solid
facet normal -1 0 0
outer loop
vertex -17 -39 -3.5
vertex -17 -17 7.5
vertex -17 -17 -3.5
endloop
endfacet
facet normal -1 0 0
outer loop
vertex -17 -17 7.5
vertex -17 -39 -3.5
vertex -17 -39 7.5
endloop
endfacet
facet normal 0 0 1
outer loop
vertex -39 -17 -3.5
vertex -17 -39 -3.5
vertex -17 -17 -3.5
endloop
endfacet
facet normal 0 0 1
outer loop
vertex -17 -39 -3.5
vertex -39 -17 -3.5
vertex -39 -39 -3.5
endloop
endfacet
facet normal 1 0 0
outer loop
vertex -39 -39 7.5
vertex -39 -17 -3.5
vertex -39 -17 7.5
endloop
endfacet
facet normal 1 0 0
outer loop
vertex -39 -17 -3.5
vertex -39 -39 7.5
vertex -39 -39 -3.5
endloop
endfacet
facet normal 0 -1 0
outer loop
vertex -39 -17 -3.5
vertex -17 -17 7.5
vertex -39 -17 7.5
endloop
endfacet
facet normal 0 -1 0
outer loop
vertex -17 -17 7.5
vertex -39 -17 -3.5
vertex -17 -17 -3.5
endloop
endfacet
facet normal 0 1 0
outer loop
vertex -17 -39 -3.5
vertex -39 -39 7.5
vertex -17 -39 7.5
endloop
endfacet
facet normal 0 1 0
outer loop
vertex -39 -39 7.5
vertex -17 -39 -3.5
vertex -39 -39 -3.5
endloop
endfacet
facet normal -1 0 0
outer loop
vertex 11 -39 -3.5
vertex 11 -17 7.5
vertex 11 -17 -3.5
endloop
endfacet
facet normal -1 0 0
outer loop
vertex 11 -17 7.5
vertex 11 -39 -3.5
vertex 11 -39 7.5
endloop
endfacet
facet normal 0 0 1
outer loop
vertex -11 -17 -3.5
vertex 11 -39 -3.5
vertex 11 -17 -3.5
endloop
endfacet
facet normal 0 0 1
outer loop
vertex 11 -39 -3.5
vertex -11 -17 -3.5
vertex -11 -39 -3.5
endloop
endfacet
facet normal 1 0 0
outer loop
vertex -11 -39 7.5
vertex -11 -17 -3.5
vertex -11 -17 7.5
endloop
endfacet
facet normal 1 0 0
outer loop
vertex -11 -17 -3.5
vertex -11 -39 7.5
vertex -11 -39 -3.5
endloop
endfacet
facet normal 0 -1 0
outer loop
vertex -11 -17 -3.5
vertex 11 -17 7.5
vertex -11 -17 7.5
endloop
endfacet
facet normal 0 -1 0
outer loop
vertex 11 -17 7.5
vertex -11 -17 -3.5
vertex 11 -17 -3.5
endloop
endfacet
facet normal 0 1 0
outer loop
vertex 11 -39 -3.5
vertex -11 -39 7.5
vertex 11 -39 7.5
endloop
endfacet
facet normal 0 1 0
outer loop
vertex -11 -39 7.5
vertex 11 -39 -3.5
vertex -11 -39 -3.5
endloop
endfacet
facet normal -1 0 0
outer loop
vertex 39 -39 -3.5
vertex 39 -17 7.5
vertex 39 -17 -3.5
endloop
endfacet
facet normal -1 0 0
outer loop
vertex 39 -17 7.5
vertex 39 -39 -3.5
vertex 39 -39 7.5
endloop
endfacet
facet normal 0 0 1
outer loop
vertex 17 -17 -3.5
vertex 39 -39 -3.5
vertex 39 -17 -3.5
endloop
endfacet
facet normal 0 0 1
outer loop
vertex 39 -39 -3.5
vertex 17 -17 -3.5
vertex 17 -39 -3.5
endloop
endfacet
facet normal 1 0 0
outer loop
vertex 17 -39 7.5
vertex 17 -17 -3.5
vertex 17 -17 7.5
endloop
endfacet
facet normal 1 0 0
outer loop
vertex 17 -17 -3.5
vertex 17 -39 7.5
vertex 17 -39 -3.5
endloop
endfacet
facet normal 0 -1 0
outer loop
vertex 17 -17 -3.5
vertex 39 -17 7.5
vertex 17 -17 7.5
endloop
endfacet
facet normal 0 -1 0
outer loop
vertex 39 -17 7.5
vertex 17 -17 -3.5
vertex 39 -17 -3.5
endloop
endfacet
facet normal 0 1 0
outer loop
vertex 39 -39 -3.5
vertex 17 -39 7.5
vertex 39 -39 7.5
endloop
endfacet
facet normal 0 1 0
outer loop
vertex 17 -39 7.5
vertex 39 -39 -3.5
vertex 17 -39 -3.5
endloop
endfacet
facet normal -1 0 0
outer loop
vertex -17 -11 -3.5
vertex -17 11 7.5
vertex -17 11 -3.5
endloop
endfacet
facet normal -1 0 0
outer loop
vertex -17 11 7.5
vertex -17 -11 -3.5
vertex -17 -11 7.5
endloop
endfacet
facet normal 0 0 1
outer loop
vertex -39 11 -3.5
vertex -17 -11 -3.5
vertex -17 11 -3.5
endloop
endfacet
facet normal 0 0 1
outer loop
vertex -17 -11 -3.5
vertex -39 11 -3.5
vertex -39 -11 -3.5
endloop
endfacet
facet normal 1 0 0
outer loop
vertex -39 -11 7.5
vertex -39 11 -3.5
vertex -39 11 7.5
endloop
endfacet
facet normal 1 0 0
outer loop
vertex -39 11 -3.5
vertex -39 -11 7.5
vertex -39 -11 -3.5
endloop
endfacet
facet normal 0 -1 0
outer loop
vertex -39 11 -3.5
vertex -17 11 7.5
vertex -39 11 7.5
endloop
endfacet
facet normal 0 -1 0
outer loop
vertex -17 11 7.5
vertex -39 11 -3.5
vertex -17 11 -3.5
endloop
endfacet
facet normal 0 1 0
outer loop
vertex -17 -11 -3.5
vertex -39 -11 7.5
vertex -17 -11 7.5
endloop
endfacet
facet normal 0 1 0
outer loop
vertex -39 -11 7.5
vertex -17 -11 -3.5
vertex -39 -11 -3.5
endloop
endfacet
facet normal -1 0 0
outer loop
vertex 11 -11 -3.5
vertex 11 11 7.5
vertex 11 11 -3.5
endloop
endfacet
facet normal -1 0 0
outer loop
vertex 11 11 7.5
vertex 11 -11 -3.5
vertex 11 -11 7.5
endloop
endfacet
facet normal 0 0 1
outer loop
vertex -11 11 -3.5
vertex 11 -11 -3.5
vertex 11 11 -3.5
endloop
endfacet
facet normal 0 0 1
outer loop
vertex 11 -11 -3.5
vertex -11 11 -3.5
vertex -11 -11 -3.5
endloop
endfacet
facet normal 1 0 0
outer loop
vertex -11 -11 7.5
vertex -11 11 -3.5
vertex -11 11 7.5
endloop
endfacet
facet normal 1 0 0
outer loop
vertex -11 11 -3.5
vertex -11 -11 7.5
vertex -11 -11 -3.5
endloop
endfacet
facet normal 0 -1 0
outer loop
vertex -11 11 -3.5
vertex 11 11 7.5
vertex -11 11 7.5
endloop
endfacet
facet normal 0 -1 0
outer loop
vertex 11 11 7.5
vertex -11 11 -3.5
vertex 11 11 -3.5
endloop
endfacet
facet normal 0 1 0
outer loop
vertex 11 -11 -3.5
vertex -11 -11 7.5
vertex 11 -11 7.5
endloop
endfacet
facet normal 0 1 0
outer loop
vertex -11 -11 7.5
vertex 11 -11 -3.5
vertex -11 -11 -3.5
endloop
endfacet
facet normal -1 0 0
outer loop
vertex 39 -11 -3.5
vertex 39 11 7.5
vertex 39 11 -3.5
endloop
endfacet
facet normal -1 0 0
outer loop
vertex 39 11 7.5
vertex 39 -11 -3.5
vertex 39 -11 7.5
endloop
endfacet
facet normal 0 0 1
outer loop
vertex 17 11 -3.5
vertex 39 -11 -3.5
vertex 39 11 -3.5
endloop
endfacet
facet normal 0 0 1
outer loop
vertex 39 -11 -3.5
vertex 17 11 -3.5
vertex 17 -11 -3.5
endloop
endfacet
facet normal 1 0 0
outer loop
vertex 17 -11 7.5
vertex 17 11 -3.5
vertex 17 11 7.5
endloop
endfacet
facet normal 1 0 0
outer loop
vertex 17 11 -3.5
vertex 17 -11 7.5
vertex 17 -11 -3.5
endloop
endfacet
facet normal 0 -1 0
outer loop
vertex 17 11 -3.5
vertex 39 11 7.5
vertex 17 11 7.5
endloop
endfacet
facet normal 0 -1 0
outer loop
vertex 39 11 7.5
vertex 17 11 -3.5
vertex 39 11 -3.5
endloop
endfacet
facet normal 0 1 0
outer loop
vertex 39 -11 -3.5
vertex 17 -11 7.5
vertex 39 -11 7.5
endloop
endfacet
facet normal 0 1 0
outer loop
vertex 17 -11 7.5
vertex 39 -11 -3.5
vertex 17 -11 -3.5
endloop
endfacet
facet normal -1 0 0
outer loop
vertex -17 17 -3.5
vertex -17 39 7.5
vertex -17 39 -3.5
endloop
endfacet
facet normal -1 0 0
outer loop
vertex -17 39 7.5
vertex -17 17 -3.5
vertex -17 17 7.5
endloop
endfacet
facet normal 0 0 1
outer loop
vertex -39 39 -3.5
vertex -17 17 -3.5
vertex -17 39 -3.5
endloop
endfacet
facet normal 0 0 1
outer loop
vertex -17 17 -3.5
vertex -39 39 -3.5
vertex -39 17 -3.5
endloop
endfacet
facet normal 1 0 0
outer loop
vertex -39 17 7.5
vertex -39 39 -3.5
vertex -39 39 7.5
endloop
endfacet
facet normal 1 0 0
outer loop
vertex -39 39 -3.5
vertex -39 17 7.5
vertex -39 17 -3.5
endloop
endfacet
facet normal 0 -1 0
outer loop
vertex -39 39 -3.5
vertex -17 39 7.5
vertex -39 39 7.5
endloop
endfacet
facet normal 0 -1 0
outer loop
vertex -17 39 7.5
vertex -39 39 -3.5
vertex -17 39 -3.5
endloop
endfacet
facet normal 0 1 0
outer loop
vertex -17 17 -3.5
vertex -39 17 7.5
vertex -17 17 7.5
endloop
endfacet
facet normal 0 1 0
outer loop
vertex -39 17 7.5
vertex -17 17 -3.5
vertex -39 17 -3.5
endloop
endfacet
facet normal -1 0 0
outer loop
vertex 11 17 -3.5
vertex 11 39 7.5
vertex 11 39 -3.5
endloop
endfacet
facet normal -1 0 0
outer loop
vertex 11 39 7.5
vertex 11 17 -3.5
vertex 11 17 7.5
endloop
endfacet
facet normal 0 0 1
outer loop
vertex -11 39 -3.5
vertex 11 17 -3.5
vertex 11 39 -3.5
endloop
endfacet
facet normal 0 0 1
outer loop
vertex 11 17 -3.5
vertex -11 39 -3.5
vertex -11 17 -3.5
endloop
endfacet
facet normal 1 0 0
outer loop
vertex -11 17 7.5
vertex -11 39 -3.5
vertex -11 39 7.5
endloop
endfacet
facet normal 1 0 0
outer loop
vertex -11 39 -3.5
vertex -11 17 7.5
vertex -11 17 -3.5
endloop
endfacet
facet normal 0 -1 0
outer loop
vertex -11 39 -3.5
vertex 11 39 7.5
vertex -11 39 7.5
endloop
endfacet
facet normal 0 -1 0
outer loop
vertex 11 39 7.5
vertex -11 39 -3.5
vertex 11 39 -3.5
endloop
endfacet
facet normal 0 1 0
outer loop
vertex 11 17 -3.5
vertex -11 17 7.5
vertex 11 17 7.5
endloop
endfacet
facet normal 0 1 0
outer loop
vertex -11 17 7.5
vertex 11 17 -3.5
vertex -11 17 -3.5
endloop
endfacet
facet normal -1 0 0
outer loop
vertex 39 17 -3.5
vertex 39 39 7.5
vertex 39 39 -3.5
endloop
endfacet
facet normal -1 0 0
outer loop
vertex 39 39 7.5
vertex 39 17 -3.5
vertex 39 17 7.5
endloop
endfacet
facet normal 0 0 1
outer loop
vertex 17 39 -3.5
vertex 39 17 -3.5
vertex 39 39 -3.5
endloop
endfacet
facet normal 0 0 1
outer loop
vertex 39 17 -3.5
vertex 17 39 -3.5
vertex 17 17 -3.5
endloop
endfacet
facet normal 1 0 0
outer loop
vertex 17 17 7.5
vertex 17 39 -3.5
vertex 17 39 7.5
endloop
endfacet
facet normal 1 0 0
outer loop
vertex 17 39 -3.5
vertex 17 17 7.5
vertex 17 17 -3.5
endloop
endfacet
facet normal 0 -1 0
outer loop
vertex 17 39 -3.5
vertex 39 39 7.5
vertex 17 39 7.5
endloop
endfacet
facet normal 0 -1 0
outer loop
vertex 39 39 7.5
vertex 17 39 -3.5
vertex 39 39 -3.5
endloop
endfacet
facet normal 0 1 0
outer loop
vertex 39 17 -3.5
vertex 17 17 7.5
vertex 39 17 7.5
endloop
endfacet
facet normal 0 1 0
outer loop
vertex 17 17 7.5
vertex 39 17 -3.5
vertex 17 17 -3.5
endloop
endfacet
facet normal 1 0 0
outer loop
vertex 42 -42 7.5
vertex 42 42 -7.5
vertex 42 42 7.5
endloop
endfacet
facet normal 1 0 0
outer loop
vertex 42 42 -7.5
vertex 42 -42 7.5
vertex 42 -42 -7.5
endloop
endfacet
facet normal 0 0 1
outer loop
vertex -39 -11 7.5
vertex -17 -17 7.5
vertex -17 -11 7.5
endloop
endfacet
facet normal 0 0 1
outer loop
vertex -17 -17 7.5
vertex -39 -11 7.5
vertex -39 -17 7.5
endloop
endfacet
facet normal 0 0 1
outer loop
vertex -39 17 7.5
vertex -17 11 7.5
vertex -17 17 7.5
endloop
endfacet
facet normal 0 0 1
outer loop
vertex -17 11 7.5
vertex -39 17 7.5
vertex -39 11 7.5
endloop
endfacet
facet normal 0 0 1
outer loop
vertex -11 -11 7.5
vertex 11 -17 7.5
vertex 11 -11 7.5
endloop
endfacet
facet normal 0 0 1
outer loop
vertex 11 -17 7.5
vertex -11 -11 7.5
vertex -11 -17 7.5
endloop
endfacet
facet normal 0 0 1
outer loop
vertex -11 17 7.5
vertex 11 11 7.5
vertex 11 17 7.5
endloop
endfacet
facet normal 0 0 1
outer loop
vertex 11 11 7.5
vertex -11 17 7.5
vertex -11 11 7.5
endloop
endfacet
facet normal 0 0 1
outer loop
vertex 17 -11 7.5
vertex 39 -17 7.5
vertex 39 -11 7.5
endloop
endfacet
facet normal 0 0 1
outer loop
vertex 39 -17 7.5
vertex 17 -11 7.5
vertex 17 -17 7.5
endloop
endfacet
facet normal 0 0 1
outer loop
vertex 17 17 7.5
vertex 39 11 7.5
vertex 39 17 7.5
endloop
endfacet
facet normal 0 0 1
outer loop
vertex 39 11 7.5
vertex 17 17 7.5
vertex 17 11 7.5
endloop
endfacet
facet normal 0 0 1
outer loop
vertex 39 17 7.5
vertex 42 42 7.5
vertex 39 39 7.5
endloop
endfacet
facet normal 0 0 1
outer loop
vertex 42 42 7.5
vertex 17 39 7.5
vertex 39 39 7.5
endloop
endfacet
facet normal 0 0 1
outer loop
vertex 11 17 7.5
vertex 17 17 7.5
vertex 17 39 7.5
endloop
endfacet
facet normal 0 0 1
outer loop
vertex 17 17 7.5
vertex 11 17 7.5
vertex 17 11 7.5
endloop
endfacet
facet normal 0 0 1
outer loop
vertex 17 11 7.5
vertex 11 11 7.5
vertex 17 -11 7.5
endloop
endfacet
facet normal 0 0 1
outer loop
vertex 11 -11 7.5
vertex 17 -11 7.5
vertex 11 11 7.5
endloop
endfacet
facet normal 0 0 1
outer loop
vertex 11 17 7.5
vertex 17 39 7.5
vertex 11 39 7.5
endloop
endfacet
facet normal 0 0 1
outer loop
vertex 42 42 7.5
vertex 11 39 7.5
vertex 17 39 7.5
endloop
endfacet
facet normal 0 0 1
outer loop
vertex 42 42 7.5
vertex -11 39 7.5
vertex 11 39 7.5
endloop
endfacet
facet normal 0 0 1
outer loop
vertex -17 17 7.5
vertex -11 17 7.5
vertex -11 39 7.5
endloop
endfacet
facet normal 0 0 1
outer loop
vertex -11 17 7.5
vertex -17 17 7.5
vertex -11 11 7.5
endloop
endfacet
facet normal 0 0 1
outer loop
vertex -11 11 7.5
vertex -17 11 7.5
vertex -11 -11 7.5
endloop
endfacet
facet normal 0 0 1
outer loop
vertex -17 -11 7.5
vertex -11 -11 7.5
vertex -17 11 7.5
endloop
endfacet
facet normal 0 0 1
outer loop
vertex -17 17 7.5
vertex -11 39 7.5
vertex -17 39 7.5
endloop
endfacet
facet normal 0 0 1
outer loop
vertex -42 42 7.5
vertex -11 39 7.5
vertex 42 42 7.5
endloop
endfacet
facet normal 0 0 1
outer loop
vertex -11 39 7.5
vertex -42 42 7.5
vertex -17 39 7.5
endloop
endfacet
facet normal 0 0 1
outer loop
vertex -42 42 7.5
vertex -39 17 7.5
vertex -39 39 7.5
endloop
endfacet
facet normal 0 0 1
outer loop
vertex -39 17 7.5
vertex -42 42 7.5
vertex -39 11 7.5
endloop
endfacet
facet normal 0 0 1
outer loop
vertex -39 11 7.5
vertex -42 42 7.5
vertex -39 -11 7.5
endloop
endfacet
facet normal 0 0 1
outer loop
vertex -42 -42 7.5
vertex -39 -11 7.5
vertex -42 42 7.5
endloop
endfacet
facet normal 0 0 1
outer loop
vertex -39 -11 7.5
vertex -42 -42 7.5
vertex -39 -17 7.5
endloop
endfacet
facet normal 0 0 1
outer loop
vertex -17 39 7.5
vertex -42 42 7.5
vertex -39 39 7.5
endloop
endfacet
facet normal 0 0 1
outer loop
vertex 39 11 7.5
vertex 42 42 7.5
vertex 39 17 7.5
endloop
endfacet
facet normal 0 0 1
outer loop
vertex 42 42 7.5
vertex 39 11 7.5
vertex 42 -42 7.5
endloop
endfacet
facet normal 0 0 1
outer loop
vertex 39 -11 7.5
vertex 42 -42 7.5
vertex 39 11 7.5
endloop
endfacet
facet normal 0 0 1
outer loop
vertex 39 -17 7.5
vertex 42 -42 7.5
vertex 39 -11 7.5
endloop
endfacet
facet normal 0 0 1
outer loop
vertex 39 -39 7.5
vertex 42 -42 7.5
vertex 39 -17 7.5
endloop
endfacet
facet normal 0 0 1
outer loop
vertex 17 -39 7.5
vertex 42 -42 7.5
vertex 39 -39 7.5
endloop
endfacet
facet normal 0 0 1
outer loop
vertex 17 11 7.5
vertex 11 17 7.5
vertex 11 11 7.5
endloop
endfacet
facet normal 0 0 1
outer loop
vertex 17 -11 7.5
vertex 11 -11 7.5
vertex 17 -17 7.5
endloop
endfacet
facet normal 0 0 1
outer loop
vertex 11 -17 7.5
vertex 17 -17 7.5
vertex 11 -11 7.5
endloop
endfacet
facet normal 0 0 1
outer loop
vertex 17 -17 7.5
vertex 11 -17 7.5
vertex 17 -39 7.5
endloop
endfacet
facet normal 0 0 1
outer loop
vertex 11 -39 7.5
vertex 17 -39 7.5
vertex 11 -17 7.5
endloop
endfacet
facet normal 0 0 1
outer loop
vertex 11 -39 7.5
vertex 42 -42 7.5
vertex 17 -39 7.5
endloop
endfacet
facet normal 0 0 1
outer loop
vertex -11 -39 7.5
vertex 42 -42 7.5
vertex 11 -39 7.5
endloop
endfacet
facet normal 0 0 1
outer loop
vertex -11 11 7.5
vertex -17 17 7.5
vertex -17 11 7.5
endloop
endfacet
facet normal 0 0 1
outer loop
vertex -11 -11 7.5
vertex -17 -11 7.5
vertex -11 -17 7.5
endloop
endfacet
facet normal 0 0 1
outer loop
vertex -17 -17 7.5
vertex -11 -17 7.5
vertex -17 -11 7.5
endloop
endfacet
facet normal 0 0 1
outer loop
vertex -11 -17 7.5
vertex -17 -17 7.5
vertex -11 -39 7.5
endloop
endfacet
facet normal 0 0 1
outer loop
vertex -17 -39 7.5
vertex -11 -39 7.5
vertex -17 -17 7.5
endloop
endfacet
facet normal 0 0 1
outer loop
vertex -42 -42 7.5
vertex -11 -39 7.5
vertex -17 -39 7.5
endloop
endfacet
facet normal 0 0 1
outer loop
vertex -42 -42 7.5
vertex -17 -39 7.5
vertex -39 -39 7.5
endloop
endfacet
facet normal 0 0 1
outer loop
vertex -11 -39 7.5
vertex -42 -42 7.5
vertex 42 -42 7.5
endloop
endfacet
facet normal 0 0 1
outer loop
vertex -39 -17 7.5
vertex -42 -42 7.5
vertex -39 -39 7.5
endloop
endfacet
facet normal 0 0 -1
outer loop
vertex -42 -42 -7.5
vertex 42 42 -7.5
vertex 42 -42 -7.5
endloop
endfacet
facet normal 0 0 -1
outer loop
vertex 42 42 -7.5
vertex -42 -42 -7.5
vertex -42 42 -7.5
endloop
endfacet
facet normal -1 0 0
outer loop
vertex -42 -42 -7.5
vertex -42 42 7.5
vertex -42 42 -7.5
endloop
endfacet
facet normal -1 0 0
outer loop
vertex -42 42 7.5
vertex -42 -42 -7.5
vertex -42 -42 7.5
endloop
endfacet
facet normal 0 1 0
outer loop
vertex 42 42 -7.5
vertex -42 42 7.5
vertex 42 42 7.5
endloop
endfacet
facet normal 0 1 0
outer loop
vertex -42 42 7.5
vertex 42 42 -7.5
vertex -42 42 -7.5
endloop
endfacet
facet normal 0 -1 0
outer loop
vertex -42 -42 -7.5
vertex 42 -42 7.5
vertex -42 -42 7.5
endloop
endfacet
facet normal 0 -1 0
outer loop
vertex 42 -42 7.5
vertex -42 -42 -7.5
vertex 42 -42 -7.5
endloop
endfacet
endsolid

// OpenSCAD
$fn = 32;

// ----------------------------------------------------------------------
// Pocket plate 84 x 84 x 15
// 3 x 3 pockets 22 mm square, 11 mm deep
// ----------------------------------------------------------------------

// --- parameters (mm) ---
thickness = 15;  // plate thickness
floor_t = 4;     // material left under each pocket
pocket = 22;     // pocket side length
pitch_x = 28;    // pocket pitch along X
pitch_y = 28;    // pocket pitch along Y
cols = 3;        // pockets per row
rows = 3;        // rows of pockets

// --- derived feature positions (mm) ---
depth = thickness - floor_t;        // = 11   pocket depth, down to the floor
span_x = (cols - 1) * pitch_x;      // = 56   distance between outer pockets
span_y = (rows - 1) * pitch_y;      // = 56   distance between outer pocket rows
origin_x = -span_x / 2;             // = -28   X of the first pocket
origin_y = -span_y / 2;             // = -28   Y of the first pocket
plate = [span_x + pocket + 6, span_y + pocket + 6, thickness];  // = [84, 84, 15]   overall size: pockets plus 3 mm of wall on each side
feature_centers = [
  [origin_x + 0 * pitch_x, origin_y + 0 * pitch_y],
  [origin_x + 1 * pitch_x, origin_y + 0 * pitch_y],
  [origin_x + 2 * pitch_x, origin_y + 0 * pitch_y],
  [origin_x + 0 * pitch_x, origin_y + 1 * pitch_y],
  [origin_x + 1 * pitch_x, origin_y + 1 * pitch_y],
  [origin_x + 2 * pitch_x, origin_y + 1 * pitch_y],
  [origin_x + 0 * pitch_x, origin_y + 2 * pitch_y],
  [origin_x + 1 * pitch_x, origin_y + 2 * pitch_y],
  [origin_x + 2 * pitch_x, origin_y + 2 * pitch_y]
];   // pocket centres, used verbatim by the cutter loop

// plate outline, then one pocket per centre in feature_centers
difference() {
  cube(plate, center = true);
  for (centre = feature_centers)
    translate([centre[0] - pocket / 2, centre[1] - pocket / 2, plate[2] / 2 - depth])
      cube([pocket, pocket, depth + 1]);  // centred on the declared pocket centre
}
